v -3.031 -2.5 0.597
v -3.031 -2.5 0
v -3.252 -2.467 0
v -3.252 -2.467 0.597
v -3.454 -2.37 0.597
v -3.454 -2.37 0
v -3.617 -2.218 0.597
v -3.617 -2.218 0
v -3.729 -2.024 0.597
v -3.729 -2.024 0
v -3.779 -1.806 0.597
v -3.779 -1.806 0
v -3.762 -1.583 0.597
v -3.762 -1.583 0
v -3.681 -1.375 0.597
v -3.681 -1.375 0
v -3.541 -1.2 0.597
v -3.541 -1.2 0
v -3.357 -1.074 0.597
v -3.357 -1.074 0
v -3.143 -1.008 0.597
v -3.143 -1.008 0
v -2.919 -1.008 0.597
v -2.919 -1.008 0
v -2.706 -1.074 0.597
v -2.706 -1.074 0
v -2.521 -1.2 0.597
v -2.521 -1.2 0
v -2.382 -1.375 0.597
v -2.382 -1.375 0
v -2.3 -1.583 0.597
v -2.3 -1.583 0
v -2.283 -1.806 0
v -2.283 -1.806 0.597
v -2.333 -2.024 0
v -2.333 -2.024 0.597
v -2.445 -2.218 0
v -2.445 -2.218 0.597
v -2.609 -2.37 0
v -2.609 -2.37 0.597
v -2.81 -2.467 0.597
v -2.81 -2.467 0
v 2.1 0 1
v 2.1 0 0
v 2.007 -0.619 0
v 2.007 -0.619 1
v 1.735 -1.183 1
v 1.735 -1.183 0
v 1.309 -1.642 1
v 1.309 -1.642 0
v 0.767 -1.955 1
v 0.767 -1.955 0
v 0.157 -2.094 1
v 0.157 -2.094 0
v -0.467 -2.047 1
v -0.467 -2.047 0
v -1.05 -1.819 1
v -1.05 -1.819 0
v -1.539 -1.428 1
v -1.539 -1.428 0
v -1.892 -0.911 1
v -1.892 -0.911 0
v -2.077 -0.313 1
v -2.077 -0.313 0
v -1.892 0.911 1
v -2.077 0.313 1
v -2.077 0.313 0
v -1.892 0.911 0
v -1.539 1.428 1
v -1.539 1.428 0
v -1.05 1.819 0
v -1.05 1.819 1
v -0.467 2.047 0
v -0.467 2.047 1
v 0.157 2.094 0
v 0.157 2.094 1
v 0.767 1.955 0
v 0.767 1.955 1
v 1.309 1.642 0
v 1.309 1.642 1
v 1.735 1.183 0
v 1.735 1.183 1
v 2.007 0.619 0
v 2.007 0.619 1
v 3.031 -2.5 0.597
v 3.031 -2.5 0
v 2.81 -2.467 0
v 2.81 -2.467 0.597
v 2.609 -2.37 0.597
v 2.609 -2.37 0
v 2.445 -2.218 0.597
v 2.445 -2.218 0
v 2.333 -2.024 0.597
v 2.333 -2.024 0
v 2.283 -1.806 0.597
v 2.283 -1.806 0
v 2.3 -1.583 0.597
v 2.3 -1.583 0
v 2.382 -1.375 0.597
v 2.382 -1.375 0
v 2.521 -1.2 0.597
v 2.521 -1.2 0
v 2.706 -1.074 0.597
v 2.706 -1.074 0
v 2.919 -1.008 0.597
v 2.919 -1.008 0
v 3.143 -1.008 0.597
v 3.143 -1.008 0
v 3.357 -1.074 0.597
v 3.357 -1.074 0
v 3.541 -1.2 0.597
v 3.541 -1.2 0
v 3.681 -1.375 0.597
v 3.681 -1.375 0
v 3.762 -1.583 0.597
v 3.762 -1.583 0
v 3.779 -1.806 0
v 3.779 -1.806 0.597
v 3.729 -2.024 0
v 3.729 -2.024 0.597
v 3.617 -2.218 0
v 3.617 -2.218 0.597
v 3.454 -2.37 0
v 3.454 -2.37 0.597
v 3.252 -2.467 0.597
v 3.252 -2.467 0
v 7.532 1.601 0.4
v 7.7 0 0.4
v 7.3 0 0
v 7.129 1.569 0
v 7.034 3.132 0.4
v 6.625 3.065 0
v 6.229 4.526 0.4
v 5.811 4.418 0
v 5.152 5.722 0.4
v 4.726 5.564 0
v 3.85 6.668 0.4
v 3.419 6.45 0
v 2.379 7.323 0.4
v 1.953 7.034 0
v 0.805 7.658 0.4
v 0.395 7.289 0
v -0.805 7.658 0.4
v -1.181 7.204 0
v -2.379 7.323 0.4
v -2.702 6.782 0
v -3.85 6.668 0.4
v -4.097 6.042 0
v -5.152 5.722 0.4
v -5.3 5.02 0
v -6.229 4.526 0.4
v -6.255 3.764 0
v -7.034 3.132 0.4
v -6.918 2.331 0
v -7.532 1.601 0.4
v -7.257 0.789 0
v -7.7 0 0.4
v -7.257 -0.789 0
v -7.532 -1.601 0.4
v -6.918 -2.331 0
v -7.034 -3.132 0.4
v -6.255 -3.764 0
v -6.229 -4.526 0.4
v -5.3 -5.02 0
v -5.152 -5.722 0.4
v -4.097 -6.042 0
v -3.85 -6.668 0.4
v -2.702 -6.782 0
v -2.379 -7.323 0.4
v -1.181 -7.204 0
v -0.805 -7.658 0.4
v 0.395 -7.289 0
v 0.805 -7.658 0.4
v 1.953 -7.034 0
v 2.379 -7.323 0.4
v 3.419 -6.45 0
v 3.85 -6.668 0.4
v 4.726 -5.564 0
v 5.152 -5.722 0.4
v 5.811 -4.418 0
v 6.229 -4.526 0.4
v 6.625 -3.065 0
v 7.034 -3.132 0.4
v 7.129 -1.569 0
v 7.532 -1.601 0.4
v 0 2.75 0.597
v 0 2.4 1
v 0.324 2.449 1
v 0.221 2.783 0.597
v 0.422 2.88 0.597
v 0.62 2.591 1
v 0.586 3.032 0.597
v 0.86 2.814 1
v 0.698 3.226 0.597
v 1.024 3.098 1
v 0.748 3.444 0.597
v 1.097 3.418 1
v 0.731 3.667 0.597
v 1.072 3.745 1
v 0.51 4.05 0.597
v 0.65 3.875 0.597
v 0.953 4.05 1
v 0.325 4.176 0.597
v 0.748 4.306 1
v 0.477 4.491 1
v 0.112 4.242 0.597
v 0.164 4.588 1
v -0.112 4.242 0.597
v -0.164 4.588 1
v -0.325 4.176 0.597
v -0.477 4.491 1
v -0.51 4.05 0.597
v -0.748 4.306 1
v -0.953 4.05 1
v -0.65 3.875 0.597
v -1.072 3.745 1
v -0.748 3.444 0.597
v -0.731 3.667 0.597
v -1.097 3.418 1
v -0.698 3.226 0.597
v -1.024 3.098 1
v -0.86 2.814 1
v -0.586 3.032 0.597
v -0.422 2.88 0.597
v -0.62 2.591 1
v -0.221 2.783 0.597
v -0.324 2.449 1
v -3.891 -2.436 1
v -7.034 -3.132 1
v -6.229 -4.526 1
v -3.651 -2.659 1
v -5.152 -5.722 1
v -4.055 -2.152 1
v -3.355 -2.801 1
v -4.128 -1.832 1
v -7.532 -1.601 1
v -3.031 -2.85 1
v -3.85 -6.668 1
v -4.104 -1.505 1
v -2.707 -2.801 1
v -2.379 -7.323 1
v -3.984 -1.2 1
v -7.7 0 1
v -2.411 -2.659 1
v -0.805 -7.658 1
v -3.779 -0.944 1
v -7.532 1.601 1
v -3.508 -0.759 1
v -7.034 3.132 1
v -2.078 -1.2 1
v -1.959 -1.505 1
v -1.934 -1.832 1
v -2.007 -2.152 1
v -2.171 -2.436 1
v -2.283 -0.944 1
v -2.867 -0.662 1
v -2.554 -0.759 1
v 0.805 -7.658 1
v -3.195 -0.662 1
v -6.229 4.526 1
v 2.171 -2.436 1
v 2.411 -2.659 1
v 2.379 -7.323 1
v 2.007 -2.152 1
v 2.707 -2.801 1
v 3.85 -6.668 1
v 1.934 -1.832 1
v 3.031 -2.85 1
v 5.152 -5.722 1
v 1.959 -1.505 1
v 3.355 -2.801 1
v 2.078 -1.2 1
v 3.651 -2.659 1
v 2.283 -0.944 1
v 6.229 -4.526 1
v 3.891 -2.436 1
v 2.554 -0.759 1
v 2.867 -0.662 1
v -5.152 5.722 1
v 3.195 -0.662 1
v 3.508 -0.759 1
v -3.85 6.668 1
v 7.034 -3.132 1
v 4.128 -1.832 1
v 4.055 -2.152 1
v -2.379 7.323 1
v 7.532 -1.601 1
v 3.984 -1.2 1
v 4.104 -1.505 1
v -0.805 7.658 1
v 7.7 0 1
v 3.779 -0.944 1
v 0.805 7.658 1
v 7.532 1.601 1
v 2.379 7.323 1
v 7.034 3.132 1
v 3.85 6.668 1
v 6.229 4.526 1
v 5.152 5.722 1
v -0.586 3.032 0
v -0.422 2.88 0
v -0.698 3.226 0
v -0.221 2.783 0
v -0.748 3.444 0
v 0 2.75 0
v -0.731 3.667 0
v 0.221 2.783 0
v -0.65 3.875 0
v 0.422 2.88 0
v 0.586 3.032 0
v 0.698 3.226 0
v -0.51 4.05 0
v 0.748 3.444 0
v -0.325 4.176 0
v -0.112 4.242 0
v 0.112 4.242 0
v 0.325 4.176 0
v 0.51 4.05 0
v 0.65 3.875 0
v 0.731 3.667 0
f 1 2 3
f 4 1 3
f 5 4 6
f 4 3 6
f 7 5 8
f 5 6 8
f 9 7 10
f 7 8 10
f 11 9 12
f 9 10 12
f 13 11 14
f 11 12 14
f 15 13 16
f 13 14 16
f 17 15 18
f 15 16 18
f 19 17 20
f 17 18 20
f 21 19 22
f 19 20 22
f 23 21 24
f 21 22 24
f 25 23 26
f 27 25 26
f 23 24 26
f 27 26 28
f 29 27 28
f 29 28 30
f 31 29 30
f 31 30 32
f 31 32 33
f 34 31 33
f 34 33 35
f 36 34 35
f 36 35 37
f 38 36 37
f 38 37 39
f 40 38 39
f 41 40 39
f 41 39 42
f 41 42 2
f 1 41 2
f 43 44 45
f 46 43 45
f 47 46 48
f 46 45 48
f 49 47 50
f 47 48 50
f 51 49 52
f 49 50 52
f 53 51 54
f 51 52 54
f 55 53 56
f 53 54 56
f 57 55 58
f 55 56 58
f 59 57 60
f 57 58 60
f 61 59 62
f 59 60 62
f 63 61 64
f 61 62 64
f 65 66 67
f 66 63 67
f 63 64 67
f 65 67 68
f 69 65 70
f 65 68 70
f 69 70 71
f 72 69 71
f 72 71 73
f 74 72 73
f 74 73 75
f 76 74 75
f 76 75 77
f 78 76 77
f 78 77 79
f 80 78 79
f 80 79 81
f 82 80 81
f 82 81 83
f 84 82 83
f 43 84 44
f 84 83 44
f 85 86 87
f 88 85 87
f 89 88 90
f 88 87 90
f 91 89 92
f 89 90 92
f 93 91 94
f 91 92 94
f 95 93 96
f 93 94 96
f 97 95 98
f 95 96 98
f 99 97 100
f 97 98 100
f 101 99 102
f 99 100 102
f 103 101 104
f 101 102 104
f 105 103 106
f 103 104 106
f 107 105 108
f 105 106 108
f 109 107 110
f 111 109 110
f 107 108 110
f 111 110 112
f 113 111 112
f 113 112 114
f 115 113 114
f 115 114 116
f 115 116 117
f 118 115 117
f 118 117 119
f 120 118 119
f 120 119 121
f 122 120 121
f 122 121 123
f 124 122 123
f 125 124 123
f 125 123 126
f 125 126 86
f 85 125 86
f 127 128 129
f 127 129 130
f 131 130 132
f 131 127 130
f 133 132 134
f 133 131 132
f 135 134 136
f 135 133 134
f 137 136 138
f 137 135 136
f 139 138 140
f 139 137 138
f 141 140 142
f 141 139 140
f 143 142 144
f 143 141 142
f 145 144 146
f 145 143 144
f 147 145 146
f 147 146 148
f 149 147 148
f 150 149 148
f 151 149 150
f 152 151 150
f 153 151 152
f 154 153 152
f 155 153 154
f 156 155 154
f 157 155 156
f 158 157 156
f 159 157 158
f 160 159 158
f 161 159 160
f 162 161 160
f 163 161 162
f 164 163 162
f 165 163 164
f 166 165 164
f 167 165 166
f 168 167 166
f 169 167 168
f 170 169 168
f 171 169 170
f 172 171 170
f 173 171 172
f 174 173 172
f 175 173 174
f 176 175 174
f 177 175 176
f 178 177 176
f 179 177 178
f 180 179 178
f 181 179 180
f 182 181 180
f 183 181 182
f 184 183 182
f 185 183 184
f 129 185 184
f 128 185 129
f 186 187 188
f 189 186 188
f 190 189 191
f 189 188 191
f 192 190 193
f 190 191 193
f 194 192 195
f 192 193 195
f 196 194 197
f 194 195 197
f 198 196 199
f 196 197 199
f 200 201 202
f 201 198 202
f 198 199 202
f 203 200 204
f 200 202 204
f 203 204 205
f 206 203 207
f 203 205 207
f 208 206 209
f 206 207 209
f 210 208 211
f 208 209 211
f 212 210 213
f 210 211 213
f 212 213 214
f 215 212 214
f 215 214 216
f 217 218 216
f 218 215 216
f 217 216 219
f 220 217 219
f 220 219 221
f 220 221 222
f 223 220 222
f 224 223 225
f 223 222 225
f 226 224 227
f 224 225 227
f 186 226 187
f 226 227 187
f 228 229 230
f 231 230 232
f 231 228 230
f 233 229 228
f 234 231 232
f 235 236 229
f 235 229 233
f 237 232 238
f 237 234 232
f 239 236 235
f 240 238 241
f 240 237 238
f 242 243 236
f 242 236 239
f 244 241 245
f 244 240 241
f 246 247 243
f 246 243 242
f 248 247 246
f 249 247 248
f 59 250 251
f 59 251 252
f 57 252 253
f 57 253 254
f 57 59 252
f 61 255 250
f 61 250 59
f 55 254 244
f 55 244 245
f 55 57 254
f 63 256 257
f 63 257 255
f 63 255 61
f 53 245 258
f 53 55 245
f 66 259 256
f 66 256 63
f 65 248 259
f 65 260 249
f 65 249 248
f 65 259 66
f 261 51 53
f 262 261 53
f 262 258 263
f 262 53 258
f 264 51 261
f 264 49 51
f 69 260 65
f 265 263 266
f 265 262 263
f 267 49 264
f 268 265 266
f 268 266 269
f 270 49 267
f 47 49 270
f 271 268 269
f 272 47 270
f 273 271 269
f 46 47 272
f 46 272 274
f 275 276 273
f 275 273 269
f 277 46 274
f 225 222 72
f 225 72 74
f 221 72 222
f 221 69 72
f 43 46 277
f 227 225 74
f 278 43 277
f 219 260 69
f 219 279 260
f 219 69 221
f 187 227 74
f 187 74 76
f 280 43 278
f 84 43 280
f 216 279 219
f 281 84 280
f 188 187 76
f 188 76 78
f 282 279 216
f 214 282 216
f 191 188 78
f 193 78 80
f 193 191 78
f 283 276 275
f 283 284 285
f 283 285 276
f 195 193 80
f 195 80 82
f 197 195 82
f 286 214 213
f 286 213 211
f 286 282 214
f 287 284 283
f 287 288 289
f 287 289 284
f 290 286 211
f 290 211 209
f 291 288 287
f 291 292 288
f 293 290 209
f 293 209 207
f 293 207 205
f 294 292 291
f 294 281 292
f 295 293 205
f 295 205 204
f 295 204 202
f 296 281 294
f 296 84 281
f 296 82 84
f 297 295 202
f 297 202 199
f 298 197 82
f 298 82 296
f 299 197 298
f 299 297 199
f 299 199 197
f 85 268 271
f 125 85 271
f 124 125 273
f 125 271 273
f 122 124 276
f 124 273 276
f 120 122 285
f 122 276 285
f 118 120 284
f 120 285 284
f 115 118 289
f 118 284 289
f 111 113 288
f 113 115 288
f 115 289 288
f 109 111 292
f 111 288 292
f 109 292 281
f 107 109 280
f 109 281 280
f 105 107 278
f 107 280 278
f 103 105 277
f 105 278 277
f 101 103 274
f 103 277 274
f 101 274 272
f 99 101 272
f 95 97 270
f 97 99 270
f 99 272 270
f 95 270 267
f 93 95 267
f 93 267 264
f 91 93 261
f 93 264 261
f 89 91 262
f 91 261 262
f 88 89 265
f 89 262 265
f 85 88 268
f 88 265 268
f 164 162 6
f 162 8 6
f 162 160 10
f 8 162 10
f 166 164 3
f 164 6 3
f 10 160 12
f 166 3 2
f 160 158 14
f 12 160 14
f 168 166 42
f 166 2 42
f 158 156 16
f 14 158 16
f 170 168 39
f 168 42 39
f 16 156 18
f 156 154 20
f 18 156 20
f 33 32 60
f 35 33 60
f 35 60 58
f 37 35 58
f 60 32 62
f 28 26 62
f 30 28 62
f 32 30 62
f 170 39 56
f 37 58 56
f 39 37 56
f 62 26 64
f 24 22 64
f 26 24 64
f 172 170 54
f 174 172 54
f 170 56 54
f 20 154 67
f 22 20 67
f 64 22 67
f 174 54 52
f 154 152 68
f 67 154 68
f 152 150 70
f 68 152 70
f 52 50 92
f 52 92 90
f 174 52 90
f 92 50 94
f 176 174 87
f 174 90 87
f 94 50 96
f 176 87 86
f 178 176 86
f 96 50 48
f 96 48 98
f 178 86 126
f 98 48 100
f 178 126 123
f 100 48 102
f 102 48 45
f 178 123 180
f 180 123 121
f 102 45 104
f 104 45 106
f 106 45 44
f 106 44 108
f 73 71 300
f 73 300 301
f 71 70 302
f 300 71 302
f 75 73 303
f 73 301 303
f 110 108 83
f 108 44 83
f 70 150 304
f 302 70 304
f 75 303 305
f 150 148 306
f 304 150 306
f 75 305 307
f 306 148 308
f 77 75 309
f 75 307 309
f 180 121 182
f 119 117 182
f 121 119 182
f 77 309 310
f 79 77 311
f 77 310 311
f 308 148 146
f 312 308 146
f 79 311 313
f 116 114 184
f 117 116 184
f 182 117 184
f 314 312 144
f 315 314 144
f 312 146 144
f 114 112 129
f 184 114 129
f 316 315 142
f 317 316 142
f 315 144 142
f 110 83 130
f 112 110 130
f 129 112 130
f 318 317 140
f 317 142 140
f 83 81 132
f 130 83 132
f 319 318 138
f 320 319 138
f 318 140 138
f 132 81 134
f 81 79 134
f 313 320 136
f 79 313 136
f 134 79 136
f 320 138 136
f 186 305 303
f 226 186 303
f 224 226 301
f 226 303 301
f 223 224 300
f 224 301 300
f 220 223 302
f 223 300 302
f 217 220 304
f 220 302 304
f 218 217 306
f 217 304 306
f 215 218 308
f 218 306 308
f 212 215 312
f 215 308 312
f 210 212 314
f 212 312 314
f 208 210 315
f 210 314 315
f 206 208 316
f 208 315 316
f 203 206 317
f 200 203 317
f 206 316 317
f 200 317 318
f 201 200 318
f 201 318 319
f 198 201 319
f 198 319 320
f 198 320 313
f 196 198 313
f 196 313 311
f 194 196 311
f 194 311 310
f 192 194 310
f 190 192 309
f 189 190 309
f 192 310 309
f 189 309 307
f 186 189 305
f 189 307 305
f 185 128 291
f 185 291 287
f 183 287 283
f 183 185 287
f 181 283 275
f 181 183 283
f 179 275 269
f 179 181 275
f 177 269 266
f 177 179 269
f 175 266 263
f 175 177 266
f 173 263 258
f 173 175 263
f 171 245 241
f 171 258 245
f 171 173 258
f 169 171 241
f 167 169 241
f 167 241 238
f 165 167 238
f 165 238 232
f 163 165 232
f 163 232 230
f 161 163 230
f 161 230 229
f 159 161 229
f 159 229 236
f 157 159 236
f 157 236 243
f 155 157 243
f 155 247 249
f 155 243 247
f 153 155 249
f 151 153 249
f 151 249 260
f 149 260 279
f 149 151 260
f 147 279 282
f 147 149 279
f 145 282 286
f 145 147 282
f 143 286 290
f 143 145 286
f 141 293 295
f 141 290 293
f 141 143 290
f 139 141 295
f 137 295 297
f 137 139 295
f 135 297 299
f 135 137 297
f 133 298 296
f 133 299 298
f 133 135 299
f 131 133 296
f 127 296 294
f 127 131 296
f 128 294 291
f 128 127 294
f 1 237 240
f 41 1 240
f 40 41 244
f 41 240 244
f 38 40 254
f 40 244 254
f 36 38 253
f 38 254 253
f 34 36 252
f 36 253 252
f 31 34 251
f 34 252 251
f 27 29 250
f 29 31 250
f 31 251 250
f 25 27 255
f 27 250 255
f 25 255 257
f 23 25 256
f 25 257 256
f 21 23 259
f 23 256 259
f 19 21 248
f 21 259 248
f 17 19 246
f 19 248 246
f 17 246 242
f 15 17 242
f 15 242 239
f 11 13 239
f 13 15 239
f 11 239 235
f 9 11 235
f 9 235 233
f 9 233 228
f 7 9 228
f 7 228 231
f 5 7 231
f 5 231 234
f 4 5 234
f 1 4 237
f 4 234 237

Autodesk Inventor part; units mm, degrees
ref_plane "YZ Plane" through (0, 0, 0) normal (1, 0, 0) x (0, 1, 0)
ref_plane "XZ Plane" through (0, 0, 0) normal (0, 1, 0) x (-1, 0, 0)
ref_plane "XY Plane" through (0, 0, 0) normal (0, 0, 1) x (1, 0, 0)
sketch "スケッチ1" plane through (0, 0, 0) normal (0, 0, 1) x (1, 0, 0)
  circle A0 centre (0, 0) radius 7.7
  circle A1 centre (0, 0) radius 2.1
  dimension "d0" = 4.2
  dimension "d1" = 15.4
extrude "押し出し1" add sketch "スケッチ1" along normal blind 1
chamfer "面取り1" distance 0.4 angle 45 1 edges at (-7.7, 0, 0)
sketch "スケッチ2" plane through (0, 0, 1) normal (0, 0, 1) x (1, 0, 0)
  circle A0 centre (0, 3.5) radius 0.5915 construction
  point P0 (0, 0)
  point P1 (-3.0311, -1.75)
  point P2 (3.0311, -1.75)
  dimension "d9" = 360
hole "穴1" at (0, 3.5, 1) at (-3.0311, -1.75, 1) at (3.0311, -1.75, 1) direction (0, 0, -1) diameter 1.5 end through all countersink diameter 2.2 countersink angle 82
properties part number "INNER_TIMING_PULLEY_COVER"
